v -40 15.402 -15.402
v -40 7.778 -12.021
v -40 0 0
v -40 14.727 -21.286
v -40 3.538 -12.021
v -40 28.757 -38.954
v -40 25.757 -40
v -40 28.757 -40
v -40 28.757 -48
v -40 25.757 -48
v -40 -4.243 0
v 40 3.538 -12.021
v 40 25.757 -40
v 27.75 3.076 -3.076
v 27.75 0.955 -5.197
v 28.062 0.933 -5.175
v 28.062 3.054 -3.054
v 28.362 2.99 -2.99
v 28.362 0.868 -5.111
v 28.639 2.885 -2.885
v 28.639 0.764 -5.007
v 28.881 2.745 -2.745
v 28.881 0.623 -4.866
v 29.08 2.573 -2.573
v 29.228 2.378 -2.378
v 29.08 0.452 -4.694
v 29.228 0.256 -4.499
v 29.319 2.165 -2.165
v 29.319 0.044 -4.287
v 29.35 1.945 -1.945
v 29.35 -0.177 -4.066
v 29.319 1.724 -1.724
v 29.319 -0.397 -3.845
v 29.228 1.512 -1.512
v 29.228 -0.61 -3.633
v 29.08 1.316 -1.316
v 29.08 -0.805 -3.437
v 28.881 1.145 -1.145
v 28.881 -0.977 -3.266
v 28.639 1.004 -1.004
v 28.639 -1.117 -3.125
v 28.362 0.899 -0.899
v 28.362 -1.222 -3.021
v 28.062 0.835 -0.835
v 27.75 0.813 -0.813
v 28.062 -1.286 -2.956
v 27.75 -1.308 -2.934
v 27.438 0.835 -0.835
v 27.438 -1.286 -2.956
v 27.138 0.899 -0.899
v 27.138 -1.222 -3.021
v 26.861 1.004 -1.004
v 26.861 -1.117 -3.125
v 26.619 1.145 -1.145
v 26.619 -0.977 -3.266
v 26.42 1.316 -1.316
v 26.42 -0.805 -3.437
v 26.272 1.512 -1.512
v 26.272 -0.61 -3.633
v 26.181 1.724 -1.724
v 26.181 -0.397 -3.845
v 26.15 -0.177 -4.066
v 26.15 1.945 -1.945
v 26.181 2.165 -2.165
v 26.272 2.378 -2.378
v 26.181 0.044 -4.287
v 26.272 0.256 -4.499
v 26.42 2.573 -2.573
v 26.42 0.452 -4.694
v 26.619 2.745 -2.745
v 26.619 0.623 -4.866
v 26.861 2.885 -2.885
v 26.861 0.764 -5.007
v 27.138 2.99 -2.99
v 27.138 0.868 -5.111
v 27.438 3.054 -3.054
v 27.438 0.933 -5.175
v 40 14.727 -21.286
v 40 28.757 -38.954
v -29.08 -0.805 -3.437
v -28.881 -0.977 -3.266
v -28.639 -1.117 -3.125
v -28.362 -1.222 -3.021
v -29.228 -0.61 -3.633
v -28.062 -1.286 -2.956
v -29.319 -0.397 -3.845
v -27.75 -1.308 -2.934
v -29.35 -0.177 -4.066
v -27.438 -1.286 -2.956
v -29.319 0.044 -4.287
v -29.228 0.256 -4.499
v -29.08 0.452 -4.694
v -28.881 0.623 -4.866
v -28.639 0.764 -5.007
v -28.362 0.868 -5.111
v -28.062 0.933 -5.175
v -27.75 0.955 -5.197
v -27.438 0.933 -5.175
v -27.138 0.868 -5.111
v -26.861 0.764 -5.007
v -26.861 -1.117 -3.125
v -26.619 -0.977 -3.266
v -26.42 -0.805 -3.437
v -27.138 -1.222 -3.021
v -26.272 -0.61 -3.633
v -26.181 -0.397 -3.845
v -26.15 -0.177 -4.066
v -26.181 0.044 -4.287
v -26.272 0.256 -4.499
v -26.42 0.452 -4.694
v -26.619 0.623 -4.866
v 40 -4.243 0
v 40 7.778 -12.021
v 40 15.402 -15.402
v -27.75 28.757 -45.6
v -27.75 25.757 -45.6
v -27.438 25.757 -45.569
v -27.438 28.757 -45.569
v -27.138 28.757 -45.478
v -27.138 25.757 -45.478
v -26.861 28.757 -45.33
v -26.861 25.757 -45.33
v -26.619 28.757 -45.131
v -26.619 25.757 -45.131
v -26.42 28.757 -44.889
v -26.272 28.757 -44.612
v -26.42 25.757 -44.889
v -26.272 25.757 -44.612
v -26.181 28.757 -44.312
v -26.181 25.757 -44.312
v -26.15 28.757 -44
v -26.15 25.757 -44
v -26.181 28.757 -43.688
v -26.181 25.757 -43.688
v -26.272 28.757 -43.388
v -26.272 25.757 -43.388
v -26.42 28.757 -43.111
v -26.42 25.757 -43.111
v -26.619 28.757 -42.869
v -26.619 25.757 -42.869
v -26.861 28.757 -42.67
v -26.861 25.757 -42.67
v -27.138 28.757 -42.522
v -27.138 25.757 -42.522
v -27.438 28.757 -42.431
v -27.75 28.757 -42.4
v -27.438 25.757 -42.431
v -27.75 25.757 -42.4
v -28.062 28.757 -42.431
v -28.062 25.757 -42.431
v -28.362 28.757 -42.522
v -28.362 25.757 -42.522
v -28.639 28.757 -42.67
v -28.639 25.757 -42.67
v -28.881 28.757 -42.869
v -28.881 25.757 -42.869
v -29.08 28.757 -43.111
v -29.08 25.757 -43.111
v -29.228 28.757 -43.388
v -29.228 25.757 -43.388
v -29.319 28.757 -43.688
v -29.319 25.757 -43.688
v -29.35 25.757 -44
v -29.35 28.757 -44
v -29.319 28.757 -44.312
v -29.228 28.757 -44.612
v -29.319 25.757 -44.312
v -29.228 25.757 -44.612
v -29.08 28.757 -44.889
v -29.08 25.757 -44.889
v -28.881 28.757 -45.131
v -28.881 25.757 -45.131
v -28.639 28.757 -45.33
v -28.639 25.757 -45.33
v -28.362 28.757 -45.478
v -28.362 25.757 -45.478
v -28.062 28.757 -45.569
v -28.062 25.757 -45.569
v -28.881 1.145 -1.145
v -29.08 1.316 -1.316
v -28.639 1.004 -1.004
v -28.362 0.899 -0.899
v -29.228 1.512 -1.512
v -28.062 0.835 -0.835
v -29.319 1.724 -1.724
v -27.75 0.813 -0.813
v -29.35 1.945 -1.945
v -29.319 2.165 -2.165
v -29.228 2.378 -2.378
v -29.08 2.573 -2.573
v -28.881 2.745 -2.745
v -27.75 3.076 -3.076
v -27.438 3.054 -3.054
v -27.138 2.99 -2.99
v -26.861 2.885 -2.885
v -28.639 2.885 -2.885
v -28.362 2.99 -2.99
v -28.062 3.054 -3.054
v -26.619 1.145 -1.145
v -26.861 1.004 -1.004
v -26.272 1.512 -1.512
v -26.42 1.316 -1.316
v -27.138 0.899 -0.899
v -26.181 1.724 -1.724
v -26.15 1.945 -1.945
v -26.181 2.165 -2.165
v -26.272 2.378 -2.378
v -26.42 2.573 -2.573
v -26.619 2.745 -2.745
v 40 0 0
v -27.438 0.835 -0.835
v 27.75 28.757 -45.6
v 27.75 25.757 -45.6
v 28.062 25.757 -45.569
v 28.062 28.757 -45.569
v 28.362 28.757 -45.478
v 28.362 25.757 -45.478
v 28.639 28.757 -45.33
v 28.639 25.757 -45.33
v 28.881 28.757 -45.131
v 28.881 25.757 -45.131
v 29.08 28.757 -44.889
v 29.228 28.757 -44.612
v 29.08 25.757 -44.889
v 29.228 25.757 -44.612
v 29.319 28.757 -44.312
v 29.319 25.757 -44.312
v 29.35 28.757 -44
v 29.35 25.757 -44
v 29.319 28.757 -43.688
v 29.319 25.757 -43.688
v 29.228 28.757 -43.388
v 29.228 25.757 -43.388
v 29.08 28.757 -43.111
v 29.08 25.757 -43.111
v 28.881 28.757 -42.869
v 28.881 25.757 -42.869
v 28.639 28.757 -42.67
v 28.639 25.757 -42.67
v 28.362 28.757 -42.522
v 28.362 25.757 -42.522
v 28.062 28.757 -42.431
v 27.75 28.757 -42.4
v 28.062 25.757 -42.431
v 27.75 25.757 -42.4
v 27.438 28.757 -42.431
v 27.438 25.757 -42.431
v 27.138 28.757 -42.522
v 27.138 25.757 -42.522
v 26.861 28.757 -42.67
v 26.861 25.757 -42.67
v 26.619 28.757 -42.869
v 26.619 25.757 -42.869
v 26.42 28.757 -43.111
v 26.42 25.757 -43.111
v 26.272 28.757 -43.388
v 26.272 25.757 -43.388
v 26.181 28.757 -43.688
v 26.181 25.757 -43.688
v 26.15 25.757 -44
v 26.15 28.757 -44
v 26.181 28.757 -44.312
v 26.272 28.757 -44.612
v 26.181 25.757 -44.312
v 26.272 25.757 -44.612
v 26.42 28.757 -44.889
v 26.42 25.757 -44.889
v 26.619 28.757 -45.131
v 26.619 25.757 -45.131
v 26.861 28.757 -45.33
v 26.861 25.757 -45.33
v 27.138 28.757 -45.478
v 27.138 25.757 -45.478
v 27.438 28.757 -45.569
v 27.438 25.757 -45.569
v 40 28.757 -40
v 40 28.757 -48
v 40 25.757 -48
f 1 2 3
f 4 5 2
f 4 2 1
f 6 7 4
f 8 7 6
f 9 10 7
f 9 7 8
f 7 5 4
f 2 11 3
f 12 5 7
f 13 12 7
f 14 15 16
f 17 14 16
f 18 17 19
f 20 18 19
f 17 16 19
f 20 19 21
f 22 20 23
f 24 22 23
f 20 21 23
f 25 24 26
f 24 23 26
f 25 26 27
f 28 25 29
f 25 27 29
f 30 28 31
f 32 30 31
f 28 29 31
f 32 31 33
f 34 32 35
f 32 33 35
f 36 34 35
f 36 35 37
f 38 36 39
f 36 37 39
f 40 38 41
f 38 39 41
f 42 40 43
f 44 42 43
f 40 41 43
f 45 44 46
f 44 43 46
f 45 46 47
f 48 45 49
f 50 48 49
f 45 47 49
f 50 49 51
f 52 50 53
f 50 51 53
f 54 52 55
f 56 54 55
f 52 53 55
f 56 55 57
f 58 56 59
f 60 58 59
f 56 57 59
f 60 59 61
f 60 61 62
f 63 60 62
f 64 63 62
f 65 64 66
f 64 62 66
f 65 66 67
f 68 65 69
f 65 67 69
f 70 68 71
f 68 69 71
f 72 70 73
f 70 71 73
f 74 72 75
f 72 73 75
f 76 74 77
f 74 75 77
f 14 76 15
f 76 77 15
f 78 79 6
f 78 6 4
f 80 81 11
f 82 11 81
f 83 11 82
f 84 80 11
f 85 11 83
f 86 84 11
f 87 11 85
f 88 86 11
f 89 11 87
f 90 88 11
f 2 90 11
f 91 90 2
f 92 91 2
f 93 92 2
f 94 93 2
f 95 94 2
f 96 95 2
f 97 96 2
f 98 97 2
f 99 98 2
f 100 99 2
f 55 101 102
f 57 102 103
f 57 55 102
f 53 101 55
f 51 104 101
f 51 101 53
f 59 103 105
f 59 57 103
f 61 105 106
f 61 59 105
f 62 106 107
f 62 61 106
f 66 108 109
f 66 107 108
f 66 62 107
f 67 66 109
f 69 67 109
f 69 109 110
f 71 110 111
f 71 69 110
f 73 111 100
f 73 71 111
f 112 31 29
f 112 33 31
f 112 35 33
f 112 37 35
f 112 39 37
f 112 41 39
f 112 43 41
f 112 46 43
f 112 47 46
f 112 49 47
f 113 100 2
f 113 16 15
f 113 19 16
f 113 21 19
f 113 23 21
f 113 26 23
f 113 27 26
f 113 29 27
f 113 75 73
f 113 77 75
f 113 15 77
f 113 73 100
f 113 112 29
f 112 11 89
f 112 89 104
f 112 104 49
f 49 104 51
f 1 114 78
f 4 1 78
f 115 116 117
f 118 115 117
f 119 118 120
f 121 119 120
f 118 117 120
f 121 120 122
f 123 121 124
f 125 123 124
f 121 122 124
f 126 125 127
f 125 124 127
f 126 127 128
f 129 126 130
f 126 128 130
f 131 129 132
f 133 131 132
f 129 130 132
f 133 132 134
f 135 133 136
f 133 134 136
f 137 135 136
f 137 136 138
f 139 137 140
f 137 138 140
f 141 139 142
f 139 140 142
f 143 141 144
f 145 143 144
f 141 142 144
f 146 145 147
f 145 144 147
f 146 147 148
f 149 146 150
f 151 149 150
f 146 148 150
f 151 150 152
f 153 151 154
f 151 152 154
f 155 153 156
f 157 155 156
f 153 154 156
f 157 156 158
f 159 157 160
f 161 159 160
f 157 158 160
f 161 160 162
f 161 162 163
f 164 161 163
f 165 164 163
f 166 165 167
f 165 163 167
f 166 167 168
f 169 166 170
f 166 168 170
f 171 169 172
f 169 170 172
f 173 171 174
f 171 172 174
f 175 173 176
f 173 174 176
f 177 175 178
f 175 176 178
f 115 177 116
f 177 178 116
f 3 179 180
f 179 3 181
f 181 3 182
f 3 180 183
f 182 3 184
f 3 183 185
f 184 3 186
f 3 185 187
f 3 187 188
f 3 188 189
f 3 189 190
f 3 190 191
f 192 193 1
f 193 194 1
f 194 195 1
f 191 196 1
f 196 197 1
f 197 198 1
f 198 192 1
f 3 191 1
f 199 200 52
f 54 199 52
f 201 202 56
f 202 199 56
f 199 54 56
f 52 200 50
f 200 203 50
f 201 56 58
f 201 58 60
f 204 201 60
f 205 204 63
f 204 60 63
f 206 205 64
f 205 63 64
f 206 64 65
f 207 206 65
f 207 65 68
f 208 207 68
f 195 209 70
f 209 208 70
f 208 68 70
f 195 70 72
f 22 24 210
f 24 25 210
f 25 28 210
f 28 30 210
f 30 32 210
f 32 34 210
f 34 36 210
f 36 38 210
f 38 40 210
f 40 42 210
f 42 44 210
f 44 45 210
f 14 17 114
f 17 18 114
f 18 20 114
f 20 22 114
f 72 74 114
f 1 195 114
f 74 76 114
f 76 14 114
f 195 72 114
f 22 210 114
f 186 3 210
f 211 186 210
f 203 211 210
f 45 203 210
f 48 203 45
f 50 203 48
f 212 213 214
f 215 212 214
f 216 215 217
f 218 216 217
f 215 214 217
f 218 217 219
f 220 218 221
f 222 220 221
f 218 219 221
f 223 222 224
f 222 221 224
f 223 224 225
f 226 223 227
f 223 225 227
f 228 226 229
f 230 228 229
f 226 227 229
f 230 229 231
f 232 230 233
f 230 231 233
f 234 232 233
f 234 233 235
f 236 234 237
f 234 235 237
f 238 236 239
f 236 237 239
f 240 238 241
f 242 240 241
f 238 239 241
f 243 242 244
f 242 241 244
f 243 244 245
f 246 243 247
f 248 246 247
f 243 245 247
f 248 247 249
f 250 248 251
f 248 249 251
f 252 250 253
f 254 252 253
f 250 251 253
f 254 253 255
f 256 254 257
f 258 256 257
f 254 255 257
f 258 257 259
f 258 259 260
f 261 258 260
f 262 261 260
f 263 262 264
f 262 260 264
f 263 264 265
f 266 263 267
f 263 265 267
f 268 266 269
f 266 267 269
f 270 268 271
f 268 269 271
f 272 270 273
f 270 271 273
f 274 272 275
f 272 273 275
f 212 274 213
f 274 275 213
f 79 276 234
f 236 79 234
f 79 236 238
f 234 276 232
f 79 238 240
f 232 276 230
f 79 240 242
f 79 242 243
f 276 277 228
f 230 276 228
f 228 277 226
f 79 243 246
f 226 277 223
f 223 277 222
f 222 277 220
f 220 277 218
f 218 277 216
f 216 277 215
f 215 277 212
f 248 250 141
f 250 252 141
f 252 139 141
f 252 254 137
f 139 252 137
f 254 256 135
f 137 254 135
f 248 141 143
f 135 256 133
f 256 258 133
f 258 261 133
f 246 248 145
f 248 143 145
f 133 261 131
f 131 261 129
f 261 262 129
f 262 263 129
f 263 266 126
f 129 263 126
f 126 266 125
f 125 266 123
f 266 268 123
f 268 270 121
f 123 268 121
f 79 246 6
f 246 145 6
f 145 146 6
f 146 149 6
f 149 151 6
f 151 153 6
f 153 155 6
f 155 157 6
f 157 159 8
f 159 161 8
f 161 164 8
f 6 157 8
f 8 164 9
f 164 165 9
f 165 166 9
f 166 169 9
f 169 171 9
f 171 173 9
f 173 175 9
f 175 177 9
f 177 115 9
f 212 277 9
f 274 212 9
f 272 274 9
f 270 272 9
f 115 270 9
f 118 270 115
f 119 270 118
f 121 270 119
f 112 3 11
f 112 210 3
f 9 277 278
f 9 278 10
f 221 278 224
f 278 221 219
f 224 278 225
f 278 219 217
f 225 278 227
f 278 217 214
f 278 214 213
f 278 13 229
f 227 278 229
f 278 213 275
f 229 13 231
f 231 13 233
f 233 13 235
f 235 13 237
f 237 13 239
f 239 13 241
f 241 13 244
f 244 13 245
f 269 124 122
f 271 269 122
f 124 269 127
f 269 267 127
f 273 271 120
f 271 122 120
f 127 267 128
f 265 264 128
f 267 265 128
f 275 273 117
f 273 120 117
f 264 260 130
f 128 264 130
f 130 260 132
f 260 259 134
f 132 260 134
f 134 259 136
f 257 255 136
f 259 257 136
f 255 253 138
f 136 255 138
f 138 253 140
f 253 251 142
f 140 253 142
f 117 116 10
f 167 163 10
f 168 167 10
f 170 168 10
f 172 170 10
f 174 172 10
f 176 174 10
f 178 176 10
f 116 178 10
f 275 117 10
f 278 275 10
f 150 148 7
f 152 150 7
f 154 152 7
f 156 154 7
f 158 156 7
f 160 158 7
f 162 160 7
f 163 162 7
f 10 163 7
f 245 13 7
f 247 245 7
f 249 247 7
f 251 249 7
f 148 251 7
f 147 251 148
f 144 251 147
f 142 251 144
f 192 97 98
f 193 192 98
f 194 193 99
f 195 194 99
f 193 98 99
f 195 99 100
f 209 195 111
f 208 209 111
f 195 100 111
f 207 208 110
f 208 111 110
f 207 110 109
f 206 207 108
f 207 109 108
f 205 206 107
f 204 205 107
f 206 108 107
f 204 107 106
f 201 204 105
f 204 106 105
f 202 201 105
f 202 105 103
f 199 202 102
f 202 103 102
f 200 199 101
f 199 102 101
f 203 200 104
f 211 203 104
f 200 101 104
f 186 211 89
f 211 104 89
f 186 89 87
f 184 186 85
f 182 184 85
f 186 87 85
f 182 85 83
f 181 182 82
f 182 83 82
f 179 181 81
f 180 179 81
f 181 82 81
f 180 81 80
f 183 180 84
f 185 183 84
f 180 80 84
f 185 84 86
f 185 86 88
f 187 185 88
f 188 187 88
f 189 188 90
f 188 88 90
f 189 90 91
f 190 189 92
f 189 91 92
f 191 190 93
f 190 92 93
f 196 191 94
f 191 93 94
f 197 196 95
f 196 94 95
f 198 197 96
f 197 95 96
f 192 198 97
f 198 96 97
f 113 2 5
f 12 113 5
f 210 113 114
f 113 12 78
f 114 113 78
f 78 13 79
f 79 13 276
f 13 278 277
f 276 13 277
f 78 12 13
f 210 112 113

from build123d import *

# Parameters (mm, degrees)
BOSS_EXTRUDE1_DEPTH = 40
SKETCH2_R           = 1.6
CUT_EXTRUDE1_DEPTH  = 3
SKETCH3_W           = 80
SKETCH3_H           = 3
BOSS_EXTRUDE2_DEPTH = 8
SKETCH4_W           = 80
SKETCH4_H           = 0.830903327
CUT_EXTRUDE2_DEPTH  = 64.839370972
CHAMFER1_SIZE       = 5.693972562
CHAMFER1_SIZE_2     = 8
SKETCH5_R           = 1.6
CUT_EXTRUDE3_DEPTH  = 3


with BuildPart() as part:
    # Sketch1 → Boss-Extrude1 (new, symmetric)
    with BuildSketch(Plane(origin=(0, 0, 0), x_dir=(0, 0, -1), z_dir=(1, 0, 0))):
        Polygon((0, 0), (0, -4.242640687), (12.02081528, 7.778174593), (12.02081528, 3.538174593), (40, 25.757359313), (40, 29.58826264), (15.02081528, 9.751475936), (15.02081528, 15.02081528), align=None)
    extrude(amount=BOSS_EXTRUDE1_DEPTH, both=True)

    # Sketch2 → Cut-Extrude1 (cut)
    with BuildSketch(Plane(origin=(0, -2.121320344, -2.121320344), x_dir=(1, 0, 0), z_dir=(0, -0.7071067811865513, -0.7071067811865438))):
        with Locations(Location((-27.75, -2.75, 0), (0, 0, 270))):
            Circle(SKETCH2_R)
        with Locations(Location((27.75, -2.75, 0), (0, 0, 270))):
            Circle(SKETCH2_R)
    extrude(amount=-CUT_EXTRUDE1_DEPTH, mode=Mode.SUBTRACT)

    # Sketch3 → Boss-Extrude2 (add)
    with BuildSketch(Plane(origin=(0, 0, -40), x_dir=(-1, 0, 0), z_dir=(0, 0, -1))):
        with Locations((0, 27.257359313)):
            Rectangle(SKETCH3_W, SKETCH3_H)
    extrude(amount=BOSS_EXTRUDE2_DEPTH)

    # Sketch4 → Cut-Extrude2 (cut, through all)
    with BuildSketch(Plane(origin=(0, 0, -40), x_dir=(-1, 0, 0), z_dir=(0, 0, -1))):
        with Locations((0, 29.172810977)):
            Rectangle(SKETCH4_W, SKETCH4_H)
    extrude(amount=-CUT_EXTRUDE2_DEPTH, mode=Mode.SUBTRACT)

    # Chamfer1
    # the kernel refuses this chamfer: 8, 5.693972562 mm, written as the material it adds along each edge
    with BuildSketch(Plane(origin=(40, 9.751475936, -15.02081528), x_dir=(0, 0.9984646393058687, 0.05539281592229428), z_dir=(-1, 0, 0))) as chamfer1_piece_1_section:
        Polygon((CHAMFER1_SIZE * 0.998464639351, CHAMFER1_SIZE * 0.0553928159248), (CHAMFER1_SIZE_2 * 0.577556137161, CHAMFER1_SIZE_2 * 0.816350971352), (0, 0), align=None)
    chamfer1_piece_1 = extrude(amount=80, mode=Mode.PRIVATE)
    chamfer1_piece_1 = split(chamfer1_piece_1, bisect_by=Plane(origin=(0, 15.189171508, -15.189171508), z_dir=(0, -0.7071067811865511, -0.7071067811865441)), keep=Keep.TOP, mode=Mode.PRIVATE)
    add(chamfer1_piece_1)

    # Sketch5 → Cut-Extrude3 (cut)
    with BuildSketch(Plane.XZ.offset(-25.757359313)):
        with Locations(Location((-27.75, -44, 0), (0, 0, 270))):
            Circle(SKETCH5_R)
        with Locations(Location((27.75, -44, 0), (0, 0, 270))):
            Circle(SKETCH5_R)
    extrude(amount=-CUT_EXTRUDE3_DEPTH, mode=Mode.SUBTRACT)


solid = part.part
